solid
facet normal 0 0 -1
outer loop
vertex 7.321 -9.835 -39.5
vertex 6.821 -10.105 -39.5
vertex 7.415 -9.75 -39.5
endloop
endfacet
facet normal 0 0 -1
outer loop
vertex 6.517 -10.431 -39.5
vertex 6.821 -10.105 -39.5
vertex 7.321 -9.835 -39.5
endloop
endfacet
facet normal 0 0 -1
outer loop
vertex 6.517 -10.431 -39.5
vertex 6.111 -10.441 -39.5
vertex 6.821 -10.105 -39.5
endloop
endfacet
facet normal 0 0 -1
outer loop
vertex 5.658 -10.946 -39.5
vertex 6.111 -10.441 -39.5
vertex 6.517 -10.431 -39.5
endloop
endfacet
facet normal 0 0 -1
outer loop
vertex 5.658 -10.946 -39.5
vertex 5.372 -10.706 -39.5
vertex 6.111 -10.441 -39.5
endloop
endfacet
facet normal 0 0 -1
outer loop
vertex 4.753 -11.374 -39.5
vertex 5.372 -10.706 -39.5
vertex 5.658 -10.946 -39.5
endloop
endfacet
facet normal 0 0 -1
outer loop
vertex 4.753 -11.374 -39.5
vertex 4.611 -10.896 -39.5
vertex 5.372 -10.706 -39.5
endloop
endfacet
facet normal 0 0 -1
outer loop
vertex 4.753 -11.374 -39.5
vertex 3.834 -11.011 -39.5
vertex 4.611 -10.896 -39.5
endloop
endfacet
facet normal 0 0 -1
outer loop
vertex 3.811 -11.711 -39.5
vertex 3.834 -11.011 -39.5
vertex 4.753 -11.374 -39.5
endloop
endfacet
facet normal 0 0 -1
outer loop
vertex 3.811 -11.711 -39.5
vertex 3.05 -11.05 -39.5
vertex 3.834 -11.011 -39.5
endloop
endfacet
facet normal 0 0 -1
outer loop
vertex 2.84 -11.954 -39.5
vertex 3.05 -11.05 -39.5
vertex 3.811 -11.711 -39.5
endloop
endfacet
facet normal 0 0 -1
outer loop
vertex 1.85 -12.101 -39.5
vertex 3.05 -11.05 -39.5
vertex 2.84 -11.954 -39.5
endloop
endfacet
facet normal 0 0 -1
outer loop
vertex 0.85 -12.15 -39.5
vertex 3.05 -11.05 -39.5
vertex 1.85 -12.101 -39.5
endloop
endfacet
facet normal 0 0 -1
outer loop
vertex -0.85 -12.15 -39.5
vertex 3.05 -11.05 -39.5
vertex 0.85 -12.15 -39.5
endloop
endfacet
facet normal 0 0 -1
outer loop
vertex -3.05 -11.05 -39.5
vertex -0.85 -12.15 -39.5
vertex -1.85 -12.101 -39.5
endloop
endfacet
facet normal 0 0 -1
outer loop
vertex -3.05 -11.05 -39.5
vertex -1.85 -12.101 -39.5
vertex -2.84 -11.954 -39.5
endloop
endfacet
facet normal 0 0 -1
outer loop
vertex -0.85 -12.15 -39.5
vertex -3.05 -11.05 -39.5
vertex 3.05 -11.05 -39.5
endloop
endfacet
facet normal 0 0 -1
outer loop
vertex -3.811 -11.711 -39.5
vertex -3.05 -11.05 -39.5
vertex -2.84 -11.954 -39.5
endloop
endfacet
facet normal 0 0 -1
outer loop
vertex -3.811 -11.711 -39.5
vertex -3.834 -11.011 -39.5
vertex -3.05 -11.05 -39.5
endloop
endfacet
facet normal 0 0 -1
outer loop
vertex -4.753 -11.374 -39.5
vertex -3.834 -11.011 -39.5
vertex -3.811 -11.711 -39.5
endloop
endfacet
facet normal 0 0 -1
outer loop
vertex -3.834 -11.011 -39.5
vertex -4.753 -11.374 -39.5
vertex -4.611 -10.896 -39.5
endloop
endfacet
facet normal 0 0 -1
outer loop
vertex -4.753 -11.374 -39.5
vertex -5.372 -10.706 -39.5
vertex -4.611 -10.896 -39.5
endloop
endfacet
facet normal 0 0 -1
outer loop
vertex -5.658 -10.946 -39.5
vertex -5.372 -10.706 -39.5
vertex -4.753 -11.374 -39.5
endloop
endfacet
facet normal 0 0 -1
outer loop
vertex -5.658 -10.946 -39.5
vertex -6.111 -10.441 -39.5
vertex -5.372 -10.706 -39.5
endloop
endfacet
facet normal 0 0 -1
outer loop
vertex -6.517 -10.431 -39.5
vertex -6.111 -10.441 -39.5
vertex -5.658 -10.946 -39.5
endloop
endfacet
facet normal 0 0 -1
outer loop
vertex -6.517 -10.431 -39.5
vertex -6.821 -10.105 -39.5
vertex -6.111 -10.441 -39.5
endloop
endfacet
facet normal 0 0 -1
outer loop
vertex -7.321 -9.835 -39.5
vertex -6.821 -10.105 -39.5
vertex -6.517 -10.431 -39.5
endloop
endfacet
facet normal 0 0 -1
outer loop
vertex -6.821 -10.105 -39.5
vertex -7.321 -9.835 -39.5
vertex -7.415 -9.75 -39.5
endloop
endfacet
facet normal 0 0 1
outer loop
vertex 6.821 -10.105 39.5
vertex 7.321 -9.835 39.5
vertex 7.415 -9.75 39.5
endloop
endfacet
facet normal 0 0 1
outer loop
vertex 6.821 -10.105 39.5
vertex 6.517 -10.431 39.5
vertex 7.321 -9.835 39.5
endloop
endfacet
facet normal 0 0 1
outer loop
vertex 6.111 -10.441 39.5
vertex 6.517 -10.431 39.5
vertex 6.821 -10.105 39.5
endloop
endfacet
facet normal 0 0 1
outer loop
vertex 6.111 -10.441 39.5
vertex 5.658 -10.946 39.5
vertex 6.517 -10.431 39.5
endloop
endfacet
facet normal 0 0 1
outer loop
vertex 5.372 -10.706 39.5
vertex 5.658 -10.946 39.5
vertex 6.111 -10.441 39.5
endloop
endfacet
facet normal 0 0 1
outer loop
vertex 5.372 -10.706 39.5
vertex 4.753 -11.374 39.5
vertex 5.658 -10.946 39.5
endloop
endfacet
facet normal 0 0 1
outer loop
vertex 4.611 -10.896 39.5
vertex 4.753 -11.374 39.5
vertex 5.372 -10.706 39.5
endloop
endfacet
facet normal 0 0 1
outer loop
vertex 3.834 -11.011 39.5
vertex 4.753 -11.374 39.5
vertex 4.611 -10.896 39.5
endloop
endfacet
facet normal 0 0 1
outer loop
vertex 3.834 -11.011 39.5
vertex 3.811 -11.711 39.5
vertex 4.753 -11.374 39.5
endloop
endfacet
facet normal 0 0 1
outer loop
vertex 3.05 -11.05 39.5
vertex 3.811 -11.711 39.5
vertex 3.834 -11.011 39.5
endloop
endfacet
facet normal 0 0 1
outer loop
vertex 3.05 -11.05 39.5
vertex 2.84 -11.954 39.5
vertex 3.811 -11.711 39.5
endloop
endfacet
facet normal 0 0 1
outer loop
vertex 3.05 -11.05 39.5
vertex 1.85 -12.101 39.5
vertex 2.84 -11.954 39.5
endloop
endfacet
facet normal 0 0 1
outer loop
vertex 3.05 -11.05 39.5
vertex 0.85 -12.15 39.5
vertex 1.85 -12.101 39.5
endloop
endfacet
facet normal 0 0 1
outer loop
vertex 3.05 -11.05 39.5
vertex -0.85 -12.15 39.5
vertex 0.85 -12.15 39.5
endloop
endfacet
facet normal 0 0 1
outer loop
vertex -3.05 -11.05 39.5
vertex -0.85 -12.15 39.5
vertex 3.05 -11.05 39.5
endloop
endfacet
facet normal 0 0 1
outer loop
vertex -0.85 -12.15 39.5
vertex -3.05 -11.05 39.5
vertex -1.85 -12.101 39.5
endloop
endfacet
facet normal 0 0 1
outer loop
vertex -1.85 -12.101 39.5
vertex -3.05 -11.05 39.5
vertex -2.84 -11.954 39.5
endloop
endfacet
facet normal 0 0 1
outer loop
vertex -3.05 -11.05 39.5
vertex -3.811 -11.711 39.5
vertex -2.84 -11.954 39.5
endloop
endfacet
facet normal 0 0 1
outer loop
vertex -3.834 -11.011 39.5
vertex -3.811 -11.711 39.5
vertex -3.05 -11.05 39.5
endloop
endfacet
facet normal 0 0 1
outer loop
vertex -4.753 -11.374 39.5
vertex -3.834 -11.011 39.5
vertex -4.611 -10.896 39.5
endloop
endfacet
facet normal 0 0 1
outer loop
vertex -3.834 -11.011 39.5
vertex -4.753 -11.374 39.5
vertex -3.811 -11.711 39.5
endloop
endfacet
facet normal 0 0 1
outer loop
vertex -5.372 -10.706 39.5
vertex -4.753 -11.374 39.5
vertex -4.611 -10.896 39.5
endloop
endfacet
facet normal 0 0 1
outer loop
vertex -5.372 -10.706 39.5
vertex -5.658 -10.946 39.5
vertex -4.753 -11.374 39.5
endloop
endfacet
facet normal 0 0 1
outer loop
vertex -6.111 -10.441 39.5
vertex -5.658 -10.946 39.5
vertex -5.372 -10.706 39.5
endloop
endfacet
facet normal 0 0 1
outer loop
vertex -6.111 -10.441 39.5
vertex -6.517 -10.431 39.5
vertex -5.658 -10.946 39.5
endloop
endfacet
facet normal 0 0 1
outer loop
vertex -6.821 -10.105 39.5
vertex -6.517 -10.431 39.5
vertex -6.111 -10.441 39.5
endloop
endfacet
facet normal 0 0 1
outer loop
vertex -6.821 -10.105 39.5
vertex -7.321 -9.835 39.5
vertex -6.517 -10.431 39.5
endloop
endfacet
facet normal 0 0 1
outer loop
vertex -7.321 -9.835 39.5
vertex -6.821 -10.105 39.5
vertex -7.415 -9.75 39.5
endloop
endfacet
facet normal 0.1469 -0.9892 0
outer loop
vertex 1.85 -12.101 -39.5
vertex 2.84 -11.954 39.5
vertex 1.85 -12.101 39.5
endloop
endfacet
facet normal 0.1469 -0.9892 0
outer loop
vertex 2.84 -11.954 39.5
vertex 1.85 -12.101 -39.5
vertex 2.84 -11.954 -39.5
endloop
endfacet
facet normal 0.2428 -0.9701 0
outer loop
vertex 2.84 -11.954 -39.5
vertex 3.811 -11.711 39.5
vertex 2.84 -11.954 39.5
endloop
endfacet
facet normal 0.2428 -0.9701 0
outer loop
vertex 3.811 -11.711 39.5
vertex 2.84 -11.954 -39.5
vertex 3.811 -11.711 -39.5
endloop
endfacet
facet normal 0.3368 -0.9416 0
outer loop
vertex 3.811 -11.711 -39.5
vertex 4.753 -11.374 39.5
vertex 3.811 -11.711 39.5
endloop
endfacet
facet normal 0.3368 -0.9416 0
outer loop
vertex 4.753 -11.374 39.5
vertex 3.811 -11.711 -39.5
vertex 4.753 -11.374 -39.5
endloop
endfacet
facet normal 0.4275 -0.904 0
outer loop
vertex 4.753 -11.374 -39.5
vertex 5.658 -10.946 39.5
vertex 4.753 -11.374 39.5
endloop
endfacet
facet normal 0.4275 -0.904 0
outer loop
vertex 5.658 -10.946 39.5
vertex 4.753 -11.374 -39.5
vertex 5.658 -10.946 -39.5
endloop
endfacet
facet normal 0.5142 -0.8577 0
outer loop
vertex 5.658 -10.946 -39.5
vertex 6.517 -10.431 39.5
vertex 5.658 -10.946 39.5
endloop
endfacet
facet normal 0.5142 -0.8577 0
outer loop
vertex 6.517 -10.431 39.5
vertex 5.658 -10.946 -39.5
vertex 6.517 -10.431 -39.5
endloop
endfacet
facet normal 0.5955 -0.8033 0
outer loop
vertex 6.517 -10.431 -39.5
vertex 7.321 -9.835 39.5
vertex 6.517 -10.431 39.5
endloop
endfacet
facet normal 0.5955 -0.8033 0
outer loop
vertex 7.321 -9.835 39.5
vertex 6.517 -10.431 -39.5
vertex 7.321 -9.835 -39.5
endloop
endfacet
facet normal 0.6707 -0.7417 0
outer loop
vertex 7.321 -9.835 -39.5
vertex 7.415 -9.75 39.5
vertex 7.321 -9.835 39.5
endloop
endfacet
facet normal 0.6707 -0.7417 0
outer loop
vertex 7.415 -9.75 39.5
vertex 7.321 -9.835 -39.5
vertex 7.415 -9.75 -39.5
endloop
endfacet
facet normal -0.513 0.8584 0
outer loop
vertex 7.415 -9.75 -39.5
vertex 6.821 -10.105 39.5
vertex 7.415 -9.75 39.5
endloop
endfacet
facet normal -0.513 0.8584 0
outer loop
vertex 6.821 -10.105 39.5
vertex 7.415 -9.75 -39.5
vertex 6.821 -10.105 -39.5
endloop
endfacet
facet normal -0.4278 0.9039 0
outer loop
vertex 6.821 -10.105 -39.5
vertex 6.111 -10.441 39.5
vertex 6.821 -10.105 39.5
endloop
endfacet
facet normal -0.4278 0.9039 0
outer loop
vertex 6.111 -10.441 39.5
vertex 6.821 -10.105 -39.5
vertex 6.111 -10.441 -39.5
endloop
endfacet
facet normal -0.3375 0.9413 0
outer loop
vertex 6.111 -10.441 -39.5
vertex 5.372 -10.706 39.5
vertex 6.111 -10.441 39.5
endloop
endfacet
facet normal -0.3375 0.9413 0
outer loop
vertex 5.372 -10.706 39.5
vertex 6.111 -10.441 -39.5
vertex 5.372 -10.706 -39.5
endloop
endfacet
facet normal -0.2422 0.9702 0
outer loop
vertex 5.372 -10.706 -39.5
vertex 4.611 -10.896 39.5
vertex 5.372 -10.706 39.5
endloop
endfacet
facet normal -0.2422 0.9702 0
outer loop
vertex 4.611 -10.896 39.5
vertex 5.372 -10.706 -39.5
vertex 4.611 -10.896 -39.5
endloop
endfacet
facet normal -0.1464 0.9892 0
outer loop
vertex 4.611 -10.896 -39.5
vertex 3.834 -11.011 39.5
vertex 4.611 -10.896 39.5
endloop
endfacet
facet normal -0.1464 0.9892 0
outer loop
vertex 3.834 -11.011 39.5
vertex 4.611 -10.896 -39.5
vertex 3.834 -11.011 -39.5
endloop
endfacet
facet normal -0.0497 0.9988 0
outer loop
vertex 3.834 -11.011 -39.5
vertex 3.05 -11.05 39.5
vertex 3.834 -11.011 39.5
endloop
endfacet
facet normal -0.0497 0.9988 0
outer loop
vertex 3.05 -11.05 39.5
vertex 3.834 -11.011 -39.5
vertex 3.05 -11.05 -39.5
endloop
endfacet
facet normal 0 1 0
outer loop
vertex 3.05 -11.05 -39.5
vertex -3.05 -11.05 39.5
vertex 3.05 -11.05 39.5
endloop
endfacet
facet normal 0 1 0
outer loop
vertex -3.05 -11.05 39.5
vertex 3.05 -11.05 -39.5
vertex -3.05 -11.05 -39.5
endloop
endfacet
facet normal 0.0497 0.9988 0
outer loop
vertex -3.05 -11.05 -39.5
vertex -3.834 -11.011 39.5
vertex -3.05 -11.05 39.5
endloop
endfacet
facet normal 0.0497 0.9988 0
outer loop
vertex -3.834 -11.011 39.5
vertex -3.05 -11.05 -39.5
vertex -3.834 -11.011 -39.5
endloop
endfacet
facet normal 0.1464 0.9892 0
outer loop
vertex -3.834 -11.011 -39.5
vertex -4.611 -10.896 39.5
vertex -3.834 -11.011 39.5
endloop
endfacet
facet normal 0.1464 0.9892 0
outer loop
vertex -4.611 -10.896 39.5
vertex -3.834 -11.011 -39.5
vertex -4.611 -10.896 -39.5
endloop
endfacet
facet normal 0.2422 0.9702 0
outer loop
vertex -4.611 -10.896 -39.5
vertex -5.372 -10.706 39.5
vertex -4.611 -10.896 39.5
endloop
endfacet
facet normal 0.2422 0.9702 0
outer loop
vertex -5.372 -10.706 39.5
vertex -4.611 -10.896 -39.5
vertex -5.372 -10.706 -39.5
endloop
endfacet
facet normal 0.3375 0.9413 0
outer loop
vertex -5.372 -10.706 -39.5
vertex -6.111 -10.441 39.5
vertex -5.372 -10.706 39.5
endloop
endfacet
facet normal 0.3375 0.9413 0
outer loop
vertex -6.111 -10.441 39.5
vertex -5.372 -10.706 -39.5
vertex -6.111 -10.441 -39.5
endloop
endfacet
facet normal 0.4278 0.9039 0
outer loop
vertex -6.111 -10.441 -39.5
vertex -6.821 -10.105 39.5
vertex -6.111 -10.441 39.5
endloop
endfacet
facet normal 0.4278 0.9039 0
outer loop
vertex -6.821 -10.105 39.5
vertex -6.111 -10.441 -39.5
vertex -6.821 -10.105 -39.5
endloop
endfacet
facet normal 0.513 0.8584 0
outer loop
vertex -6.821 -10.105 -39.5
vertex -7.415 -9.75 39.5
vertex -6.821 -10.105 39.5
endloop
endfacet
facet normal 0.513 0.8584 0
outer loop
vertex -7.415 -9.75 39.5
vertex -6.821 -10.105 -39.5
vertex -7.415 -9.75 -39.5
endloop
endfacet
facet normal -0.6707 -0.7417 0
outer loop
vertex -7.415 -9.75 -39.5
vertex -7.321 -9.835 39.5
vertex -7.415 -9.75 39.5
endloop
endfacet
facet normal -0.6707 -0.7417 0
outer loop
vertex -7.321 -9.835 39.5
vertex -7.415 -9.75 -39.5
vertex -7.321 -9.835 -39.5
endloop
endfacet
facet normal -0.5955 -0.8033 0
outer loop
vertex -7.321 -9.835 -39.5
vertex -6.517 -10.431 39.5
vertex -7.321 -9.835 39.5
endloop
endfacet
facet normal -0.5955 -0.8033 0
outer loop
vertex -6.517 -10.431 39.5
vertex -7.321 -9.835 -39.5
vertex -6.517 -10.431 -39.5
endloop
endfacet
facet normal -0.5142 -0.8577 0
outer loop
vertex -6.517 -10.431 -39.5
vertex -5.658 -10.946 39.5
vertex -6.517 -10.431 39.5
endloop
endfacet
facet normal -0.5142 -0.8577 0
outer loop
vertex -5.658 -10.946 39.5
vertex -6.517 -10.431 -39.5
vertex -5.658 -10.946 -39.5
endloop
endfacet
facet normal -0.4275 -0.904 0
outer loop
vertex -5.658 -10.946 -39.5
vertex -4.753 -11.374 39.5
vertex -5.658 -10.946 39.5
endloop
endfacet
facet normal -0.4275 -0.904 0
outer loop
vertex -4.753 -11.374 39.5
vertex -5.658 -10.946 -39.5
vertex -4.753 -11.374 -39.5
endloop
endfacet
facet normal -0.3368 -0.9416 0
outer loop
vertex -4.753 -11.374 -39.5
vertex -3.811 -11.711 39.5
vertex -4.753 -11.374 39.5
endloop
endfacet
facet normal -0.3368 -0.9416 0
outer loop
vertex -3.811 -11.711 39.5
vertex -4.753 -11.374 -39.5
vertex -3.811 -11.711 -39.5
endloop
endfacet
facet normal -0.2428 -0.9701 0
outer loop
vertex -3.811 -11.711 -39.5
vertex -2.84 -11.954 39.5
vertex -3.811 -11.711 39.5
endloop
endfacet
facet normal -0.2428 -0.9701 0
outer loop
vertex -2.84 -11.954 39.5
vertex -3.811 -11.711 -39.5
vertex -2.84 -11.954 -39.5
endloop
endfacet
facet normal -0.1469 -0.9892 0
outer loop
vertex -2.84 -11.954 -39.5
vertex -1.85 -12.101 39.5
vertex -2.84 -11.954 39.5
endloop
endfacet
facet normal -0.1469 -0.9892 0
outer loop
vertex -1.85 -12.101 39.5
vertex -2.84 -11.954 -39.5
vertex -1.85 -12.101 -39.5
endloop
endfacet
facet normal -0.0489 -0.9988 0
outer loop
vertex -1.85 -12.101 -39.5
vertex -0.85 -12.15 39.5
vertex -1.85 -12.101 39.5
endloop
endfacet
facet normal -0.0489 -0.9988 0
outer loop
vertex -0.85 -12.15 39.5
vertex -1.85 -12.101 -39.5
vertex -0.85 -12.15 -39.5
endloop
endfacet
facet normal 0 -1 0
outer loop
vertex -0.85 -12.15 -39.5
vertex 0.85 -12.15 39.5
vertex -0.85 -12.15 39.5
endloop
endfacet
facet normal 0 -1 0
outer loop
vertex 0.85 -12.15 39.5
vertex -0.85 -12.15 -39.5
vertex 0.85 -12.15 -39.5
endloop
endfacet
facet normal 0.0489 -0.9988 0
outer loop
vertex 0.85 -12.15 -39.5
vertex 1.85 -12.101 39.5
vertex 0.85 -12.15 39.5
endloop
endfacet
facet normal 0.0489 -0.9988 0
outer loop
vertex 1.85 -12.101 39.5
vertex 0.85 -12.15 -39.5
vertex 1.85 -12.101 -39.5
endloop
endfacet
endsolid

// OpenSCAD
$fn=64;

bbox_x = 22.1;
bbox_y = 24.3;
bbox_z = 79.0;

wall = 2.2;
outer_r = 10.2;
inner_r = outer_r - wall;

channel_depth = bbox_y;
outer_y = channel_depth;
inner_y = channel_depth - wall;

tab_th = 1.2;
tab_len = 3.0;
tab_h = 10.0;

boss_r = 3.2;
boss_hole_r = 1.8;
boss_len = 4.2;

boss_z1 = 18.0;
boss_z2 = 61.0;

module u_shell(){
    difference(){
        union(){
            translate([0,0,0])
                linear_extrude(height=bbox_z, center=true, convexity=10)
                    difference(){
                        offset(r=outer_r) square([bbox_x-2*outer_r, outer_y-2*outer_r], center=true);
                        offset(r=inner_r) square([bbox_x-2*inner_r, inner_y-2*inner_r], center=true);
                    }

            translate([0, (outer_y/2 - tab_th/2), 0])
                cube([bbox_x, tab_th, tab_h], center=true);

            translate([0, (outer_y/2 + tab_len/2), 0])
                cube([bbox_x-2.0, tab_len, tab_th], center=true);
        }

        translate([0, (outer_y/2 + 0.01), 0])
            cube([bbox_x+2, outer_y, bbox_z+2], center=true);
    }
}

module boss_pair(zpos){
    for (sx=[-1,1]){
        translate([sx*(bbox_x/2 - wall - boss_len/2), 0, zpos - bbox_z/2])
            rotate([0,90,0])
                difference(){
                    cylinder(h=boss_len, r=boss_r, center=true);
                    cylinder(h=boss_len+0.6, r=boss_hole_r, center=true);
                }
    }
}

module clip(){
    difference(){
        union(){
            u_shell();
            boss_pair(boss_z1);
            boss_pair(boss_z2);
        }

        translate([0,0,0])
            linear_extrude(height=bbox_z+2, center=true, convexity=10)
                offset(r=inner_r)
                    square([bbox_x-2*inner_r, inner_y-2*inner_r], center=true);
    }
}

clip();
